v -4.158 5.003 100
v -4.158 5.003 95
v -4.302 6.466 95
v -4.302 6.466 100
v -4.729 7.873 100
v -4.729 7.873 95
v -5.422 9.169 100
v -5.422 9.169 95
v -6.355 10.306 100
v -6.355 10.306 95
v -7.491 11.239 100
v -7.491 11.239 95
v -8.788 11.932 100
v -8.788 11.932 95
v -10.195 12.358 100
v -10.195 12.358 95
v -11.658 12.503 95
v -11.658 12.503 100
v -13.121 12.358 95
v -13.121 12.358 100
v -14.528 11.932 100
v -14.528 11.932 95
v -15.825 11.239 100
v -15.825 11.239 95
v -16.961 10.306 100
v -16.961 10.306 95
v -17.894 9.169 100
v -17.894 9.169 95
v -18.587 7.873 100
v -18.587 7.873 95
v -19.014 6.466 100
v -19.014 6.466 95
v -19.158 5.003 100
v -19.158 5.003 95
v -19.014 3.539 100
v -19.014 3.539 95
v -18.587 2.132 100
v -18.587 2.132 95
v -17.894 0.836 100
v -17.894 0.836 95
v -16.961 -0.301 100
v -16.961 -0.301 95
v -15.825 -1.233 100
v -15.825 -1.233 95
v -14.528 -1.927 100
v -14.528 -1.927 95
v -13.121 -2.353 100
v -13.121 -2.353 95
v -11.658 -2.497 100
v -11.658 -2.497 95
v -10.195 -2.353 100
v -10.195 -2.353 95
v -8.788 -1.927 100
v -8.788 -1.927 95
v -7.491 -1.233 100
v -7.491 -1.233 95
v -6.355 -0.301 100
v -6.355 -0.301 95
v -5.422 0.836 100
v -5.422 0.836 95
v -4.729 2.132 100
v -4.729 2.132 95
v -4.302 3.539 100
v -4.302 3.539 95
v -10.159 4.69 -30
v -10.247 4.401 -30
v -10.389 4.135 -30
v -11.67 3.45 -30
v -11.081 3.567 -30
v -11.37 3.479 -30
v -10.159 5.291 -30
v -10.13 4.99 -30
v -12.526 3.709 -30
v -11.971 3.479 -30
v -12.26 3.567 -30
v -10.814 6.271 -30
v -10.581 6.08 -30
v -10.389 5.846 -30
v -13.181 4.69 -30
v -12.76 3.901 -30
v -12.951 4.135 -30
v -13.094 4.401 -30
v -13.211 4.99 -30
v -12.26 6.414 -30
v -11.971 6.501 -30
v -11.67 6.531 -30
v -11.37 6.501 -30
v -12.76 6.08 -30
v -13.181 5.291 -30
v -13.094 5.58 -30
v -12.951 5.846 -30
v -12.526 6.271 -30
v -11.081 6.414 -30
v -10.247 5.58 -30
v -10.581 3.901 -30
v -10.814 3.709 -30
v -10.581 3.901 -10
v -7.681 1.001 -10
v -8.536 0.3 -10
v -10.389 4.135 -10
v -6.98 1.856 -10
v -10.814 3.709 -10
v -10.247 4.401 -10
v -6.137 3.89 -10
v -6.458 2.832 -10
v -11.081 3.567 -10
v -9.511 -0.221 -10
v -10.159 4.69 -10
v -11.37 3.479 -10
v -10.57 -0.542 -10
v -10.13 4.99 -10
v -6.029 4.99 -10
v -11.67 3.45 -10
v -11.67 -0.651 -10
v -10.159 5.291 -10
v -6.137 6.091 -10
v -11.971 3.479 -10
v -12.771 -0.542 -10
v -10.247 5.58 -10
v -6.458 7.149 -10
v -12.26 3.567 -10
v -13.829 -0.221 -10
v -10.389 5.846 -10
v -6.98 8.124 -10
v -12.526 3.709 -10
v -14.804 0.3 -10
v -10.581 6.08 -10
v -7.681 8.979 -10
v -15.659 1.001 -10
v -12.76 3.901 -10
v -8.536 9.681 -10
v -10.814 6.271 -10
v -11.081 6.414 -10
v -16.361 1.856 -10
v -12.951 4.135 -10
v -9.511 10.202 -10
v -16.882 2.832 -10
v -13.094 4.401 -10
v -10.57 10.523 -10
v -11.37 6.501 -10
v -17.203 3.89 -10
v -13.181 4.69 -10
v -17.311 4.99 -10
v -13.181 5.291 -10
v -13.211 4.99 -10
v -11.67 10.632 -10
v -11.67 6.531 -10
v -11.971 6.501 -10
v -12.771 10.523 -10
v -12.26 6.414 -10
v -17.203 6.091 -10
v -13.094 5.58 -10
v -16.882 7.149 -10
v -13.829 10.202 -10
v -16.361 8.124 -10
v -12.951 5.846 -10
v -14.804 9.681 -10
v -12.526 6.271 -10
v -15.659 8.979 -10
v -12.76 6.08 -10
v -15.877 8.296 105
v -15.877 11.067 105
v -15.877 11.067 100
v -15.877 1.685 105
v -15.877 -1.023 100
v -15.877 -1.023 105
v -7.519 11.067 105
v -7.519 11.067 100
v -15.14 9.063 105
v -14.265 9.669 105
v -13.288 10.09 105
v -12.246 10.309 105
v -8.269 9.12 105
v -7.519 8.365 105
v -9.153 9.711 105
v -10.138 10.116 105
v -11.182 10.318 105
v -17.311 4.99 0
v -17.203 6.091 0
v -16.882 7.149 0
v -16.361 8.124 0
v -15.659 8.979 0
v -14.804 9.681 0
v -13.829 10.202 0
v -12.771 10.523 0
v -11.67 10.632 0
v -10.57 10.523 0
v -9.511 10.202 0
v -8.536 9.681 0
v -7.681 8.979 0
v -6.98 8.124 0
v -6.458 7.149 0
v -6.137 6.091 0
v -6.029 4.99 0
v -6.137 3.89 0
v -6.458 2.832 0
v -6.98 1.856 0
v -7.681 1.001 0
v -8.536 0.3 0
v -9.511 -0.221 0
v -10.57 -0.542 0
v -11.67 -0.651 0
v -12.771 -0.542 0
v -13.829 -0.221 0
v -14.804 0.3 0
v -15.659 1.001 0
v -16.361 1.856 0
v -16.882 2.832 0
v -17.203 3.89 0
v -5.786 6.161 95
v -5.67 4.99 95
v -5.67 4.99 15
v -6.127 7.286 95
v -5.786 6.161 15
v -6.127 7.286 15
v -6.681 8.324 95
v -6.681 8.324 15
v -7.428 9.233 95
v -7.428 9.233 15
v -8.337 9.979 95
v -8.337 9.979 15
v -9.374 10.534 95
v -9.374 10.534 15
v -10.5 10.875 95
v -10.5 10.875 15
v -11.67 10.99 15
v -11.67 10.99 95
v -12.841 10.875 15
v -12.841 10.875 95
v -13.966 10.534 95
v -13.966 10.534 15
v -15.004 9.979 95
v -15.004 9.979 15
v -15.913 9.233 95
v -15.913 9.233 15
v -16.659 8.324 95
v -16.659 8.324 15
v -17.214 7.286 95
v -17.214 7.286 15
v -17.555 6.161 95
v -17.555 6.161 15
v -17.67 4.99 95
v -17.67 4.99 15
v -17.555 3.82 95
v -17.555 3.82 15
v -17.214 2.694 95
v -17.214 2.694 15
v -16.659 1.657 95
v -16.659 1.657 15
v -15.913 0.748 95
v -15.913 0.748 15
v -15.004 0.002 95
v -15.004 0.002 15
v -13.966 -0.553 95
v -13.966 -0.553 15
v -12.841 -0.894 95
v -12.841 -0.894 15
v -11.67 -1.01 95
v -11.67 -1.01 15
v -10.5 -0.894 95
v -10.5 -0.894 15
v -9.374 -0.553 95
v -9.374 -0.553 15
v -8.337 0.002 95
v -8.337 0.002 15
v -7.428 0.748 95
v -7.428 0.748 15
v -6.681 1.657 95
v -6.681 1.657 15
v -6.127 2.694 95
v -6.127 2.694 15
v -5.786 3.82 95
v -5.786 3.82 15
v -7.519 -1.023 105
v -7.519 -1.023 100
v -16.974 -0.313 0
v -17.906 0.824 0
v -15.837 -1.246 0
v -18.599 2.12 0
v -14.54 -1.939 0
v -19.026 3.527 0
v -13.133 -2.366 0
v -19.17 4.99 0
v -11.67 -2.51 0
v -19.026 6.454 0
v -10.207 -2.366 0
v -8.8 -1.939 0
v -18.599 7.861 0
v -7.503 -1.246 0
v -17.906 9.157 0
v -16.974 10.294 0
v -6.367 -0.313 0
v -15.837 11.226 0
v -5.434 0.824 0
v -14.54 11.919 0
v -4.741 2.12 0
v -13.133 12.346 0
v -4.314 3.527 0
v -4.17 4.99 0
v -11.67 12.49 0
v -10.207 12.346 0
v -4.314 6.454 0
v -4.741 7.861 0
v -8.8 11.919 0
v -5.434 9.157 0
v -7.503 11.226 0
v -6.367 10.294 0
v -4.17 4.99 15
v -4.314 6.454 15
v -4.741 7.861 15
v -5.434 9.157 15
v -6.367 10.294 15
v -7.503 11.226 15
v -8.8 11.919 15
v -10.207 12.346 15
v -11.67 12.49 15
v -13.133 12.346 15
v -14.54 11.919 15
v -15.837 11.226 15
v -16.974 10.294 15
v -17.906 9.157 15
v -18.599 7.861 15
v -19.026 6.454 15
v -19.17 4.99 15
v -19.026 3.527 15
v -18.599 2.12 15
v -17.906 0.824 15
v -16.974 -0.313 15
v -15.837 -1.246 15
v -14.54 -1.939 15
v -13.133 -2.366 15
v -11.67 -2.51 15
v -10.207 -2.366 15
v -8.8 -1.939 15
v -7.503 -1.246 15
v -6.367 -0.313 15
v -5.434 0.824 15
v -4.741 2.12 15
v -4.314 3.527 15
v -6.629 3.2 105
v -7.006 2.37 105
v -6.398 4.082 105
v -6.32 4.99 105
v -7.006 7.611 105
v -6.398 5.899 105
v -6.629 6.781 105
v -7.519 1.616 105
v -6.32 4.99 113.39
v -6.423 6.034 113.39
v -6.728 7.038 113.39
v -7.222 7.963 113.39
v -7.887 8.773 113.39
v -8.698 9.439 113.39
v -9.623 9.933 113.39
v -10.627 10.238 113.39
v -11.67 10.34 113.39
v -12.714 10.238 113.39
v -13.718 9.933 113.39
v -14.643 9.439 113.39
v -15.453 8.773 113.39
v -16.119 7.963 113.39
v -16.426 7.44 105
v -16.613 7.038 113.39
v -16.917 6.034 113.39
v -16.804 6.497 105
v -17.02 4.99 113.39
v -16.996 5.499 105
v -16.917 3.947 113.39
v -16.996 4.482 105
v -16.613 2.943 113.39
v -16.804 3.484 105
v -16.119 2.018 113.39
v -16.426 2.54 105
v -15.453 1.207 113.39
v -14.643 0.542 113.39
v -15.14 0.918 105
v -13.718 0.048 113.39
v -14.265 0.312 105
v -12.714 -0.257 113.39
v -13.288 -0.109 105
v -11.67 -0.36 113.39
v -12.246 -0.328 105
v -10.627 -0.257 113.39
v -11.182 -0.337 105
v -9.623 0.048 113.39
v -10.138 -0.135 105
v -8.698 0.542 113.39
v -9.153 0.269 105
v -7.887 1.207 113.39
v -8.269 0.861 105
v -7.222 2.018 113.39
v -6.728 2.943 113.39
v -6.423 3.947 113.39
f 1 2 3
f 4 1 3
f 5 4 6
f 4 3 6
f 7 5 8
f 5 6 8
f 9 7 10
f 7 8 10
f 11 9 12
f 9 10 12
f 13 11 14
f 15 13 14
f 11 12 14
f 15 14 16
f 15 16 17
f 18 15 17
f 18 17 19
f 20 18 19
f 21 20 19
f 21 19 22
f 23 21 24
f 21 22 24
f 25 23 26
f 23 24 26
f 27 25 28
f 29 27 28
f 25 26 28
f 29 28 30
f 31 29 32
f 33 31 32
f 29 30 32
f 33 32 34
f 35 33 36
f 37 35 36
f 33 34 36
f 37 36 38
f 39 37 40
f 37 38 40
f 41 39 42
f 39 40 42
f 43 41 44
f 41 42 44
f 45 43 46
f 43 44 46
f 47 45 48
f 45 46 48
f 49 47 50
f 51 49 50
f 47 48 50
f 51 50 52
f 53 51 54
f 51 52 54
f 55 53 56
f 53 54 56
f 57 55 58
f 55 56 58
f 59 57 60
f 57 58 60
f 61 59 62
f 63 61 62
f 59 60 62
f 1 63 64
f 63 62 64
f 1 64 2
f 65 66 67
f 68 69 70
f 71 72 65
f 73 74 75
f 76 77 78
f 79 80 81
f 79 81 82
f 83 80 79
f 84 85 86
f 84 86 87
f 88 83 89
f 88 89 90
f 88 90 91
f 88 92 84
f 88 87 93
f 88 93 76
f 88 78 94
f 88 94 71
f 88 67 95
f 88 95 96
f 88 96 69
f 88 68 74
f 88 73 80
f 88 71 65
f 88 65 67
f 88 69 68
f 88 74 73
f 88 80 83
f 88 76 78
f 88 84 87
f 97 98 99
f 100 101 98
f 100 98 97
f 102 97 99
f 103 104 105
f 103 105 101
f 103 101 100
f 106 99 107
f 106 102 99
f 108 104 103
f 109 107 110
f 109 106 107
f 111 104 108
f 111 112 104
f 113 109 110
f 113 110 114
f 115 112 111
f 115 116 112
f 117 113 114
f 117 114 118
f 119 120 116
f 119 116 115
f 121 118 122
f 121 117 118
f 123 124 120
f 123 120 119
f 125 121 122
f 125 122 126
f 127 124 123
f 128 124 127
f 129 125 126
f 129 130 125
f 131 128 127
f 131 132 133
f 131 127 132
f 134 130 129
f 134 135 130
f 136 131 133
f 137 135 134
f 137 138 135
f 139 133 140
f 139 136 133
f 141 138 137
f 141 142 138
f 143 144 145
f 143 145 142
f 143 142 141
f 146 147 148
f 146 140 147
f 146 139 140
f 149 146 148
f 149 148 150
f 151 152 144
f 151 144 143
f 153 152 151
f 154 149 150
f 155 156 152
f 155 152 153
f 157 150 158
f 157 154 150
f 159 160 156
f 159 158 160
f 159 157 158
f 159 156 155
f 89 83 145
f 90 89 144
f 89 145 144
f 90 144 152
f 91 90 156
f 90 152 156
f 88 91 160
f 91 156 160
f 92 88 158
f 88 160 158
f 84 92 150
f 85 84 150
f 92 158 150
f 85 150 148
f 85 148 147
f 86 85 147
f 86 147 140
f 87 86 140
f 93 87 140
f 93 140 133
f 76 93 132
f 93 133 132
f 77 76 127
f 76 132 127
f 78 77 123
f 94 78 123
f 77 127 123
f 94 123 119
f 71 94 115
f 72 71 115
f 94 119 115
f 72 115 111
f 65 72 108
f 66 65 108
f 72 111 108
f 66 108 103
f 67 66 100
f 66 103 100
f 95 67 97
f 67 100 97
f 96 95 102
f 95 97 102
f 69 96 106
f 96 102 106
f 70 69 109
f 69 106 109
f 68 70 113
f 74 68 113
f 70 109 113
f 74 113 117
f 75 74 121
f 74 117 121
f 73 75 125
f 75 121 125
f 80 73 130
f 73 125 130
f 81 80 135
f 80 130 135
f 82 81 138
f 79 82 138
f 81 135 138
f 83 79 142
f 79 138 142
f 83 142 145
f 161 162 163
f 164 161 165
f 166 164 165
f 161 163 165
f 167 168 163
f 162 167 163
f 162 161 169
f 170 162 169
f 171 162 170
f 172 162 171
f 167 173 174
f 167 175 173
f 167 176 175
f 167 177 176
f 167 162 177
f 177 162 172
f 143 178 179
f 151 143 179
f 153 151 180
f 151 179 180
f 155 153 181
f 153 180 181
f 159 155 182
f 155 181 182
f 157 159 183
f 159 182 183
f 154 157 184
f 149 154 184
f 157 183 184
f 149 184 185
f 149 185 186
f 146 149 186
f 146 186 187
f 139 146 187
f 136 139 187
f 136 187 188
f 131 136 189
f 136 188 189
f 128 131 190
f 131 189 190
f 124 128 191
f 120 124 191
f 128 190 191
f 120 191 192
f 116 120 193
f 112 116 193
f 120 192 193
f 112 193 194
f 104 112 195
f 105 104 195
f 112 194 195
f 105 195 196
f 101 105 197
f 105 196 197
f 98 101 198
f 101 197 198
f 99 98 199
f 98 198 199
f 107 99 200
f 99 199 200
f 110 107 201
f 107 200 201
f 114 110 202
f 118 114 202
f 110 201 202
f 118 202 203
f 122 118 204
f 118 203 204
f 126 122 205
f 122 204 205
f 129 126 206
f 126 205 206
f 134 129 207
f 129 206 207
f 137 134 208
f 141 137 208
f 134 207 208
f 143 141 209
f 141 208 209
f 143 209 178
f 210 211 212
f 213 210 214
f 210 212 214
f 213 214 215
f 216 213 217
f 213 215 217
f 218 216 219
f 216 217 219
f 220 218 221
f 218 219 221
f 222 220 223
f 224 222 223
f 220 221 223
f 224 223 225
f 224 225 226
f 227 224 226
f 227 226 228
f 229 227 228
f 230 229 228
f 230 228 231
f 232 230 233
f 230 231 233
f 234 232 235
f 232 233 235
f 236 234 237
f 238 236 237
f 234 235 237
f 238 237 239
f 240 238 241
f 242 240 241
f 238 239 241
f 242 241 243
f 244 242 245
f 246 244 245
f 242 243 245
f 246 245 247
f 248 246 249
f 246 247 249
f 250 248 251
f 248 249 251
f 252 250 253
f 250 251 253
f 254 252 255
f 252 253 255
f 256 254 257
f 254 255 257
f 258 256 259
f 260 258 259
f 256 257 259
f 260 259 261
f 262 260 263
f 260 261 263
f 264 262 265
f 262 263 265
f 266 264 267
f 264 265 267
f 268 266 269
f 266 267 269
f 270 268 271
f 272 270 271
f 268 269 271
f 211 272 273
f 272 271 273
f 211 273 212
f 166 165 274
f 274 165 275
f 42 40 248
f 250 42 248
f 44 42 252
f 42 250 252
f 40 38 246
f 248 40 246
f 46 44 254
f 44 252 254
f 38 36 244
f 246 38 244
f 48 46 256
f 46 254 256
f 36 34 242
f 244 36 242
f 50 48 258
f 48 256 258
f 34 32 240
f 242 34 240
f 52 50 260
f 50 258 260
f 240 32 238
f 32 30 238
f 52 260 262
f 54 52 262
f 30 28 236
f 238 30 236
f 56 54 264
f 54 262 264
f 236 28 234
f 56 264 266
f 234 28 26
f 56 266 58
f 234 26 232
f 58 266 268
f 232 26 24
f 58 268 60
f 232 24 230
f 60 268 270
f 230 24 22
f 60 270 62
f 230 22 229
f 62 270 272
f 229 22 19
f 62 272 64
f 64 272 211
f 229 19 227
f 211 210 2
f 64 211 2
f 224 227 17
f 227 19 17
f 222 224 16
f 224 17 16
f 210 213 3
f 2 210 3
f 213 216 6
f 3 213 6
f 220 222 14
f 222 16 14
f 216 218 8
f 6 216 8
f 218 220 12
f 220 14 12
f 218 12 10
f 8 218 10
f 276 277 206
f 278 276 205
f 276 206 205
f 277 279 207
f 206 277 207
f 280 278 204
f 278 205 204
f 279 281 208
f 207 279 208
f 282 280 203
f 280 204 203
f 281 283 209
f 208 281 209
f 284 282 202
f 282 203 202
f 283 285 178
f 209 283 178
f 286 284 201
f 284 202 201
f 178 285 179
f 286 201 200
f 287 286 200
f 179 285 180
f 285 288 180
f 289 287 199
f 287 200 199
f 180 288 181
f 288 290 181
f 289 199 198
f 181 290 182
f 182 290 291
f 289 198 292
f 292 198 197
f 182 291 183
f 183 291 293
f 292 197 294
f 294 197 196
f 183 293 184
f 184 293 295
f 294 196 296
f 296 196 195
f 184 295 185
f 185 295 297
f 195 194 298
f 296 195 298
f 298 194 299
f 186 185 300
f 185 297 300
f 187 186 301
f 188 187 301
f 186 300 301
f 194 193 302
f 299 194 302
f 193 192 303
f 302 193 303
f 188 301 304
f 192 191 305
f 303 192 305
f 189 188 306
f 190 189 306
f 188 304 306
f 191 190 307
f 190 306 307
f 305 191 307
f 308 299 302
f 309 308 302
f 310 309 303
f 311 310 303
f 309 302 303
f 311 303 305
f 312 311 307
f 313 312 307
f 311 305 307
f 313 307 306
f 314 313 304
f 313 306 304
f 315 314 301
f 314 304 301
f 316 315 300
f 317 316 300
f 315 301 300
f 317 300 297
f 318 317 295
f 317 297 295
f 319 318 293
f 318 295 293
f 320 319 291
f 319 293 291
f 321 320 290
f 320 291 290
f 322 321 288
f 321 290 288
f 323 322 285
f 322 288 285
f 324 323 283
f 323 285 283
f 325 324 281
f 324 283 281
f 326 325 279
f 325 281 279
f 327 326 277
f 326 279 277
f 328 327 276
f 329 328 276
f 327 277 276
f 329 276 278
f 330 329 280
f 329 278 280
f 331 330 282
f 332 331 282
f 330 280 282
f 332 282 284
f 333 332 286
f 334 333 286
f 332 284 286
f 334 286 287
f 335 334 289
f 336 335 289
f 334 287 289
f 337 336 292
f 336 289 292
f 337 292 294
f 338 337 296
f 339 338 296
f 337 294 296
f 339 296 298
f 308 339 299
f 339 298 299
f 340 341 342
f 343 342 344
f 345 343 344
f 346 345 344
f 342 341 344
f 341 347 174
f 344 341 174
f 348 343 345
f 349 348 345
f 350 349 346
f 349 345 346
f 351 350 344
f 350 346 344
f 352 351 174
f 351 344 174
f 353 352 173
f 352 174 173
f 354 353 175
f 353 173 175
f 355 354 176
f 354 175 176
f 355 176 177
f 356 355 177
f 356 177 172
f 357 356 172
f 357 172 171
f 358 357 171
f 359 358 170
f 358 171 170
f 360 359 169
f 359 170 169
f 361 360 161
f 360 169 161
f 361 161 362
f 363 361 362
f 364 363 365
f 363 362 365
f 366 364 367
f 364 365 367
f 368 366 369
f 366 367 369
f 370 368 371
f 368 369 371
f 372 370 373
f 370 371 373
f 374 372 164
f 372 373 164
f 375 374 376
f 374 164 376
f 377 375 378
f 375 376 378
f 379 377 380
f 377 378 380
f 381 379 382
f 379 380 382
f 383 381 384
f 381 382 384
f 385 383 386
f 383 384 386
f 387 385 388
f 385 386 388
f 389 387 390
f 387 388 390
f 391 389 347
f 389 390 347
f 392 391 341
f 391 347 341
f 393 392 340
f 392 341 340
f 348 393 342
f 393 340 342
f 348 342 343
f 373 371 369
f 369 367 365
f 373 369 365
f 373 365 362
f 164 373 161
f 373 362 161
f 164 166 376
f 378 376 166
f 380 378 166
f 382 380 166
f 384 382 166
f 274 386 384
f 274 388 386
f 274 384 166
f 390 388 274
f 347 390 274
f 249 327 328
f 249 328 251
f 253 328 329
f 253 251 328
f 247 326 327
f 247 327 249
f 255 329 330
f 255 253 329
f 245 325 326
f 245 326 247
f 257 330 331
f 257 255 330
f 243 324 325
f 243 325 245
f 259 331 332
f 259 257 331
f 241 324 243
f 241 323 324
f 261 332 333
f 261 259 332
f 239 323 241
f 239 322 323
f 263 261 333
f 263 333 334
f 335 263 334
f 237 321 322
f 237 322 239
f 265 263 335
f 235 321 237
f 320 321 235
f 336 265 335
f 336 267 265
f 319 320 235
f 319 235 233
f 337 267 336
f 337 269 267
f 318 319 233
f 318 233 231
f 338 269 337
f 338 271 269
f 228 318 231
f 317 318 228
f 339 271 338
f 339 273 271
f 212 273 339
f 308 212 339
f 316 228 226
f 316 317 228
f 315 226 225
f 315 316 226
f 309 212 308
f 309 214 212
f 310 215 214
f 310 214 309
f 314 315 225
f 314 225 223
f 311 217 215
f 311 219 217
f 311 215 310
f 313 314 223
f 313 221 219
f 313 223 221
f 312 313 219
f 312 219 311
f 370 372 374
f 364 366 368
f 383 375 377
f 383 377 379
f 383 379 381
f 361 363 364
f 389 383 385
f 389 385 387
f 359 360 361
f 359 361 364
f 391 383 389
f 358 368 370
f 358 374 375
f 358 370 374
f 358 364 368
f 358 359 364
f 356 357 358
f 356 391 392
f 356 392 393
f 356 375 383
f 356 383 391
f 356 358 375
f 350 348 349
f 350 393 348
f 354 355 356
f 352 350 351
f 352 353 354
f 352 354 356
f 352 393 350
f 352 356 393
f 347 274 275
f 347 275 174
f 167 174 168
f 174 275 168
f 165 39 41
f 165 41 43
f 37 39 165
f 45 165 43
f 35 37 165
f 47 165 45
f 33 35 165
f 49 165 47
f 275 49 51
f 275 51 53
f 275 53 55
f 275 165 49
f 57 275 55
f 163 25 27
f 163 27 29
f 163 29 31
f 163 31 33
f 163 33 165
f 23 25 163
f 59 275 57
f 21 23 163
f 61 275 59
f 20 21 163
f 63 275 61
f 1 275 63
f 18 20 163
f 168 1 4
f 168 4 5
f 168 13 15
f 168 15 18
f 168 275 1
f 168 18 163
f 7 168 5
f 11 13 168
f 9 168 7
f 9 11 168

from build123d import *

# Parameters (mm, degrees)
CROQUIS1_R              = 7.5
SALIENTE_EXTRUIR1_DEPTH = 15
CROQUIS2_R              = 6
SALIENTE_EXTRUIR2_DEPTH = 80
CROQUIS4_R              = 7.5
SALIENTE_EXTRUIR3_DEPTH = 5
SALIENTE_EXTRUIR4_DEPTH = 5
CROQUIS7_R              = 5.35
SALIENTE_EXTRUIR6_DEPTH = 8.39
CROQUIS8_R              = 5.641199124
SALIENTE_EXTRUIR7_DEPTH = 10
CROQUIS9_R              = 1.540513395
SALIENTE_EXTRUIR8_DEPTH = 20


with BuildPart() as part:
    # Croquis1 → Saliente-Extruir1 (new body)
    with BuildSketch(Plane.XY):
        with Locations((-11.670259109, 4.990389294)):
            Circle(CROQUIS1_R)
    extrude(amount=SALIENTE_EXTRUIR1_DEPTH)

    # Croquis2 → Saliente-Extruir2 (add)
    with BuildSketch(Plane.XY.offset(15)):
        with Locations((-11.670259109, 4.990389294)):
            Circle(CROQUIS2_R)
    extrude(amount=SALIENTE_EXTRUIR2_DEPTH)

    # Croquis4 → Saliente-Extruir3 (add)
    with BuildSketch(Plane.XY.offset(95)):
        with Locations((-11.658111308, 5.002537095)):
            Circle(CROQUIS4_R)
    extrude(amount=SALIENTE_EXTRUIR3_DEPTH)

    # Croquis5 → Saliente-Extruir4 (add)
    with BuildSketch(Plane.XY.offset(100)):
        Polygon((-7.518768123, 4.990389294), (-7.518768123, 11.066839741), (-15.877144731, 11.066839741), (-15.877144731, -1.023256523), (-7.518768123, -1.023256523), align=None)
    extrude(amount=SALIENTE_EXTRUIR4_DEPTH)

    # Croquis7 → Saliente-Extruir6 (add)
    with BuildSketch(Plane.XY.offset(105)):
        with Locations((-11.670259109, 4.990389294)):
            Circle(CROQUIS7_R)
    extrude(amount=SALIENTE_EXTRUIR6_DEPTH)

    # Croquis8 → Saliente-Extruir7 (add)
    with BuildSketch(Plane(origin=(0, 0, 0), x_dir=(-1, 0, 0), z_dir=(0, 0, -1))):
        with Locations((11.670259109, 4.990389294)):
            Circle(CROQUIS8_R)
    extrude(amount=SALIENTE_EXTRUIR7_DEPTH)

    # Croquis9 → Saliente-Extruir8 (add)
    with BuildSketch(Plane(origin=(0, 0, -10), x_dir=(-1, 0, 0), z_dir=(0, 0, -1))):
        with Locations((11.670259109, 4.990389294)):
            Circle(CROQUIS9_R)
    extrude(amount=SALIENTE_EXTRUIR8_DEPTH)


solid = part.part
